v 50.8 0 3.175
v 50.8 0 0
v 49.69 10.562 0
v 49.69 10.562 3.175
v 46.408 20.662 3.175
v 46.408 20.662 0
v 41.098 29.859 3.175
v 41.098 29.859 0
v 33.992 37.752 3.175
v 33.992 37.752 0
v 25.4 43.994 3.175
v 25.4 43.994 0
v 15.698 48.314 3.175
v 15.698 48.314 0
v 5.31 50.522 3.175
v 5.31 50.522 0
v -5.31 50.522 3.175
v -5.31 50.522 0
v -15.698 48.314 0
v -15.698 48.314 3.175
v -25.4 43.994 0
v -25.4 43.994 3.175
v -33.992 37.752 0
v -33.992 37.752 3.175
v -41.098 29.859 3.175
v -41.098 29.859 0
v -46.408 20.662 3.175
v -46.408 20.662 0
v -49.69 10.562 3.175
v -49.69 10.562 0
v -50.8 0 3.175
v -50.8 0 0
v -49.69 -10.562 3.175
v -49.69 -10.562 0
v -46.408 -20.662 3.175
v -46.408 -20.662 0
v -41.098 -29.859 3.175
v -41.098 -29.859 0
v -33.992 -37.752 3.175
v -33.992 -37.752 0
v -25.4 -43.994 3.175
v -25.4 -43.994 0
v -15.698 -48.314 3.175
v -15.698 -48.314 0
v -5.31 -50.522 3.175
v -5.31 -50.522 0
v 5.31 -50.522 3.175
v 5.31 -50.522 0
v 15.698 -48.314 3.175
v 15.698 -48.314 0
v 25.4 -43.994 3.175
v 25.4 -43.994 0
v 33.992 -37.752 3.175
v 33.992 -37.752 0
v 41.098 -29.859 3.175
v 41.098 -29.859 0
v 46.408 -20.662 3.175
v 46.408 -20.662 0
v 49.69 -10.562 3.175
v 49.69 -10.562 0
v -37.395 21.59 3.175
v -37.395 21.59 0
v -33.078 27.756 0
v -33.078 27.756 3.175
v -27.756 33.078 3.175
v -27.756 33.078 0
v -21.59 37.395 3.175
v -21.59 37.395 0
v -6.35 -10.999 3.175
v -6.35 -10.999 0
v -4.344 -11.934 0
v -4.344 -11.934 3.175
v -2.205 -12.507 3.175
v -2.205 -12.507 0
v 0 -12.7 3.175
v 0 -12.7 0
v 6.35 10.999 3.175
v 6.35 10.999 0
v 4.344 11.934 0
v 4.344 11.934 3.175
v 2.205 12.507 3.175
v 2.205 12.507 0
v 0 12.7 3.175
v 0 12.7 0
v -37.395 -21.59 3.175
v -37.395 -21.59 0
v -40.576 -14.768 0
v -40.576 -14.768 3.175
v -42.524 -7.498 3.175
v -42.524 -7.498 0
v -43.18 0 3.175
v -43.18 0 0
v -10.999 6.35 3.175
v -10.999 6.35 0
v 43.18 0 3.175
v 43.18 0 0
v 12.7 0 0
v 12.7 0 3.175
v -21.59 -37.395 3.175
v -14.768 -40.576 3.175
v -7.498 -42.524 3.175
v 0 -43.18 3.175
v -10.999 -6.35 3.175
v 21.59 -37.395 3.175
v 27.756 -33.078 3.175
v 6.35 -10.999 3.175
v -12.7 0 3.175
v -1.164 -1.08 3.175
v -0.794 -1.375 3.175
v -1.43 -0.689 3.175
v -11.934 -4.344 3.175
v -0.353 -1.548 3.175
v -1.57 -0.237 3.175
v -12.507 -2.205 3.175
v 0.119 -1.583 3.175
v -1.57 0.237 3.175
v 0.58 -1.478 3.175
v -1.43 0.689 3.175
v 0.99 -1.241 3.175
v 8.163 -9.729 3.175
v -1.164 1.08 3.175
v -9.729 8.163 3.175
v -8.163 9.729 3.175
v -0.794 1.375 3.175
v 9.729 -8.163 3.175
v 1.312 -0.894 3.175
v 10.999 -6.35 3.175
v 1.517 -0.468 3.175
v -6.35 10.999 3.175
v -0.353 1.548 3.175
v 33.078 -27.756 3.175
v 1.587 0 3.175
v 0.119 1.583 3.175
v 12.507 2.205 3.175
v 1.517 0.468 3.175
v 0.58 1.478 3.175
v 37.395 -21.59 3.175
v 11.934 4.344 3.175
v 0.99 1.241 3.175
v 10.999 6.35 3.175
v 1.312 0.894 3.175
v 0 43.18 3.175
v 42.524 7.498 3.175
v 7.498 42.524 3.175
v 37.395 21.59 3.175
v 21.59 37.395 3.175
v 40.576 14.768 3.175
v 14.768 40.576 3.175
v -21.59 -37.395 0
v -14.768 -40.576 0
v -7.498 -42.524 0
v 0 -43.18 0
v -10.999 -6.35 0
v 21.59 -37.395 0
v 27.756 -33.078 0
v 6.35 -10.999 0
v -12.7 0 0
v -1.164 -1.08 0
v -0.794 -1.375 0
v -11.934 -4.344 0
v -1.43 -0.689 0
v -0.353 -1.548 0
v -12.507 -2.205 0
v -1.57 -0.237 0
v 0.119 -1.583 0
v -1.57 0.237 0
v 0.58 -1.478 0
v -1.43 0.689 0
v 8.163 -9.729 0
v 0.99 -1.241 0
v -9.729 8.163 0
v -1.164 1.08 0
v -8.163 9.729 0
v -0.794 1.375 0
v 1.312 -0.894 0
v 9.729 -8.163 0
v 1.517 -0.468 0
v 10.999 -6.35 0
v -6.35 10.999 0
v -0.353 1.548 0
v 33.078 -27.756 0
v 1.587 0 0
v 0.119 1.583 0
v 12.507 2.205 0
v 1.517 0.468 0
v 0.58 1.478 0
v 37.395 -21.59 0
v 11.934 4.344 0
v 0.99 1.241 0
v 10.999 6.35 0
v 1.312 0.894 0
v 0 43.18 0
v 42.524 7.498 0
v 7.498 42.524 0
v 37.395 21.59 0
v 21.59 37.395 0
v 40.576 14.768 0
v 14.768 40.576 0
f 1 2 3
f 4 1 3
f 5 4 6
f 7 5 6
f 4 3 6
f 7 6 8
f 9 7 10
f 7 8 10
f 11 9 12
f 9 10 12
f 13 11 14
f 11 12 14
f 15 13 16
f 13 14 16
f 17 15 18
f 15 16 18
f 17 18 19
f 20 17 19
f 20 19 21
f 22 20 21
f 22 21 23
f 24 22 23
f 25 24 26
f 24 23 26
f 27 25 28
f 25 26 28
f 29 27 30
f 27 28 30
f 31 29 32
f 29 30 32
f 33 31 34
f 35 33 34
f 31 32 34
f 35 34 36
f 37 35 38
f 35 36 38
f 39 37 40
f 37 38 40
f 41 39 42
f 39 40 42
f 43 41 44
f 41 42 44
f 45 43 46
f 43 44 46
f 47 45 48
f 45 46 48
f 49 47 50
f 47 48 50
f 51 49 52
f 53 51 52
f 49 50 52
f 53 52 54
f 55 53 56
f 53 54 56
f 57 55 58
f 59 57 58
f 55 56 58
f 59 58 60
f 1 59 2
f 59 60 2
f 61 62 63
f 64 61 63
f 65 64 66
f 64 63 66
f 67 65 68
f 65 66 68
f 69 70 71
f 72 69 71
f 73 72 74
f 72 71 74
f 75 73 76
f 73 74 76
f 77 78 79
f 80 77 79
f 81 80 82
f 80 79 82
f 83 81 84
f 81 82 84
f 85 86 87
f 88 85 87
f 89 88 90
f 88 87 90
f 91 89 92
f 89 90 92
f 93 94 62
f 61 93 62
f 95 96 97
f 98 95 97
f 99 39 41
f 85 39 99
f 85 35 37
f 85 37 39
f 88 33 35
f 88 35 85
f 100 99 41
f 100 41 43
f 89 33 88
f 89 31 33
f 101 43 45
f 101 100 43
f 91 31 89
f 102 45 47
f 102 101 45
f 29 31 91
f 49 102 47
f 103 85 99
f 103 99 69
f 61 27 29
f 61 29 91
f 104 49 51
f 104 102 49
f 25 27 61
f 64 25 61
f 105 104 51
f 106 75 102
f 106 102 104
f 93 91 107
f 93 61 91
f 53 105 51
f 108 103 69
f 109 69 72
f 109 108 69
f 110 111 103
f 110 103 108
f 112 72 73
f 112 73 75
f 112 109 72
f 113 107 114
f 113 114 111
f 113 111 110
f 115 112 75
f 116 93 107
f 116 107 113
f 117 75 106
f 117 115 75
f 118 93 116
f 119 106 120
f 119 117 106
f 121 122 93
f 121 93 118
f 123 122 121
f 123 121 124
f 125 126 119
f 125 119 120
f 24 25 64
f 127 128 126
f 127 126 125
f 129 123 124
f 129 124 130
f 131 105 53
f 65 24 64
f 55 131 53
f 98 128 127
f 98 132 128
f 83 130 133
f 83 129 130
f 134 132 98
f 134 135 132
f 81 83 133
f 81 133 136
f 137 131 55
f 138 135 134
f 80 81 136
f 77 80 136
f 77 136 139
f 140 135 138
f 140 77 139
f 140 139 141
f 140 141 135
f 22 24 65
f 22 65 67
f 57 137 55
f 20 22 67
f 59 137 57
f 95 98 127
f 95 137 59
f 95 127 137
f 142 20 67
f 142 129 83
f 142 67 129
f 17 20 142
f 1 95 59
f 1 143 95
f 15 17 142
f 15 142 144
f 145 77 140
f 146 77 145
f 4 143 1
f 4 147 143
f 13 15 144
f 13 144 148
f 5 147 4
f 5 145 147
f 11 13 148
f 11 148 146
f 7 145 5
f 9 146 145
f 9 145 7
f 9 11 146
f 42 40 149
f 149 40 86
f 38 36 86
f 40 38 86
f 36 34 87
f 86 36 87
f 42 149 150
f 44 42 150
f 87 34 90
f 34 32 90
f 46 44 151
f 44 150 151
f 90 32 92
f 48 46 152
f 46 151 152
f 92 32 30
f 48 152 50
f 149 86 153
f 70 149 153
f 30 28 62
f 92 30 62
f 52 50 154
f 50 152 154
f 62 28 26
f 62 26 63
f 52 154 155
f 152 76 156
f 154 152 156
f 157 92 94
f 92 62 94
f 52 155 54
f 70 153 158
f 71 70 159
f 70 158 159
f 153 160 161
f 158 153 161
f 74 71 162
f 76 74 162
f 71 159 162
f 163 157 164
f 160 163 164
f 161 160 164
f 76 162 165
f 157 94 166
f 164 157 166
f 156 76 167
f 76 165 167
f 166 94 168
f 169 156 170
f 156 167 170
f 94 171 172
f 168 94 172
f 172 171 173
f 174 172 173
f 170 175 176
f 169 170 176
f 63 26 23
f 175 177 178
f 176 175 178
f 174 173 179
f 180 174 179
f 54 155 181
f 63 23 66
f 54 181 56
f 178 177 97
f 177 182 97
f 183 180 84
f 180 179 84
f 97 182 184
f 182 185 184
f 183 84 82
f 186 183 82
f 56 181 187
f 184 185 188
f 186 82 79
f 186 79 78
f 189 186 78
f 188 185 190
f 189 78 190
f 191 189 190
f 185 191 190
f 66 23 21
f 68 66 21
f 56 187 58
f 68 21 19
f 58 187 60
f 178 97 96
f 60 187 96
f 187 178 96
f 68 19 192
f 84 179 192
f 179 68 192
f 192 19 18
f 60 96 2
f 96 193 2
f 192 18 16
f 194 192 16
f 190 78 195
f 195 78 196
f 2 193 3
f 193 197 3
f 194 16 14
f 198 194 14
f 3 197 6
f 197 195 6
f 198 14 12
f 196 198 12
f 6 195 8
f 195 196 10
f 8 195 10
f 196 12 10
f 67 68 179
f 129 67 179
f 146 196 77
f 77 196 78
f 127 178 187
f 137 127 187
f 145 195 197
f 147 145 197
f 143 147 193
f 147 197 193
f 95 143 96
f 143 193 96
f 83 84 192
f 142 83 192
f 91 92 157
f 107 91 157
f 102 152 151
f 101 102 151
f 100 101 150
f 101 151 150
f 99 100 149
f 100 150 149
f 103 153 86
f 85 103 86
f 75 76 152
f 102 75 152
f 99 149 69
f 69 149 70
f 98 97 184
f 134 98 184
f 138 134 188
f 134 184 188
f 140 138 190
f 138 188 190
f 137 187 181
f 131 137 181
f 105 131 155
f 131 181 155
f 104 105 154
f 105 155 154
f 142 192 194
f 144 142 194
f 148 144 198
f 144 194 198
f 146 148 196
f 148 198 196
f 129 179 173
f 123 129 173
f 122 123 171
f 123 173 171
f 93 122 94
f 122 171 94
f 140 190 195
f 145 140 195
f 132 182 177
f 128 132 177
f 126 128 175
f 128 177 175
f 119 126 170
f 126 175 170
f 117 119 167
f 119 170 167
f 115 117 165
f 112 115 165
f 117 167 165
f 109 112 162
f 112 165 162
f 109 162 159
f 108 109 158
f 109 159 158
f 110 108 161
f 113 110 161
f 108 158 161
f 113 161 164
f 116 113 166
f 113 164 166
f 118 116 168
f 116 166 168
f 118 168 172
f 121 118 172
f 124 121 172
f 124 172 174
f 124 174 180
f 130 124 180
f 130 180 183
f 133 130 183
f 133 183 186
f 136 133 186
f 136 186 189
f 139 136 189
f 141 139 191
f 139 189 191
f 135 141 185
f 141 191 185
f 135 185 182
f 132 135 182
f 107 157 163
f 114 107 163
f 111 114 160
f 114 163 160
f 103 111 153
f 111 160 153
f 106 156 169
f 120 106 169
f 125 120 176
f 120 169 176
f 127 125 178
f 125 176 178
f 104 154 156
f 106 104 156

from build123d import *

# Parameters (mm, degrees)
F0_R     = 50.8
F1_DEPTH = 3.175


with BuildPart() as f1:
    # F0 (on Top) → F1 (new body)
    with BuildSketch(Plane.XY):
        Circle(F0_R)
        with BuildLine():
            Line((-21.59, -37.394977), (-6.35, -10.998523))
            ThreePointArc((-6.35, -10.998523), (-3.287002, -12.267258), (0, -12.7))
            Line((0, -12.7), (0, -43.18))
            ThreePointArc((0, -43.18), (-11.175806, -41.708677), (-21.59, -37.394977))
        make_face(mode=Mode.SUBTRACT)
        with BuildLine():
            Line((-43.18, 0), (-12.7, 0))
            ThreePointArc((-12.7, 0), (-12.267258, -3.287002), (-10.998523, -6.35))
            Line((-10.998523, -6.35), (-37.394977, -21.59))
            ThreePointArc((-37.394977, -21.59), (-41.708677, -11.175806), (-43.18, 0))
        make_face(mode=Mode.SUBTRACT)
        with BuildLine():
            ThreePointArc((-1.5875, 0), (0, 1.5875), (1.5875, 0))
            ThreePointArc((1.5875, 0), (0, -1.5875), (-1.5875, 0))
        make_face(mode=Mode.SUBTRACT)
        with BuildLine():
            Line((10.998523, -6.35), (37.394977, -21.59))
            ThreePointArc((37.394977, -21.59), (30.532871, -30.532871), (21.59, -37.394977))
            Line((21.59, -37.394977), (6.35, -10.998523))
            ThreePointArc((6.35, -10.998523), (8.980256, -8.980256), (10.998523, -6.35))
        make_face(mode=Mode.SUBTRACT)
        with BuildLine():
            ThreePointArc((-37.394977, 21.59), (-30.532871, 30.532871), (-21.59, 37.394977))
            Line((-21.59, 37.394977), (-6.35, 10.998523))
            ThreePointArc((-6.35, 10.998523), (-8.980256, 8.980256), (-10.998523, 6.35))
            Line((-10.998523, 6.35), (-37.394977, 21.59))
        make_face(mode=Mode.SUBTRACT)
        with BuildLine():
            ThreePointArc((12.7, 0), (12.267258, 3.287002), (10.998523, 6.35))
            Line((10.998523, 6.35), (37.394977, 21.59))
            ThreePointArc((37.394977, 21.59), (41.708677, 11.175806), (43.18, 0))
            Line((43.18, 0), (12.7, 0))
        make_face(mode=Mode.SUBTRACT)
        with BuildLine():
            Line((0, 12.7), (0, 43.18))
            ThreePointArc((0, 43.18), (11.175806, 41.708677), (21.59, 37.394977))
            Line((21.59, 37.394977), (6.35, 10.998523))
            ThreePointArc((6.35, 10.998523), (3.287002, 12.267258), (0, 12.7))
        make_face(mode=Mode.SUBTRACT)
    extrude(amount=F1_DEPTH)


solid = f1.part
